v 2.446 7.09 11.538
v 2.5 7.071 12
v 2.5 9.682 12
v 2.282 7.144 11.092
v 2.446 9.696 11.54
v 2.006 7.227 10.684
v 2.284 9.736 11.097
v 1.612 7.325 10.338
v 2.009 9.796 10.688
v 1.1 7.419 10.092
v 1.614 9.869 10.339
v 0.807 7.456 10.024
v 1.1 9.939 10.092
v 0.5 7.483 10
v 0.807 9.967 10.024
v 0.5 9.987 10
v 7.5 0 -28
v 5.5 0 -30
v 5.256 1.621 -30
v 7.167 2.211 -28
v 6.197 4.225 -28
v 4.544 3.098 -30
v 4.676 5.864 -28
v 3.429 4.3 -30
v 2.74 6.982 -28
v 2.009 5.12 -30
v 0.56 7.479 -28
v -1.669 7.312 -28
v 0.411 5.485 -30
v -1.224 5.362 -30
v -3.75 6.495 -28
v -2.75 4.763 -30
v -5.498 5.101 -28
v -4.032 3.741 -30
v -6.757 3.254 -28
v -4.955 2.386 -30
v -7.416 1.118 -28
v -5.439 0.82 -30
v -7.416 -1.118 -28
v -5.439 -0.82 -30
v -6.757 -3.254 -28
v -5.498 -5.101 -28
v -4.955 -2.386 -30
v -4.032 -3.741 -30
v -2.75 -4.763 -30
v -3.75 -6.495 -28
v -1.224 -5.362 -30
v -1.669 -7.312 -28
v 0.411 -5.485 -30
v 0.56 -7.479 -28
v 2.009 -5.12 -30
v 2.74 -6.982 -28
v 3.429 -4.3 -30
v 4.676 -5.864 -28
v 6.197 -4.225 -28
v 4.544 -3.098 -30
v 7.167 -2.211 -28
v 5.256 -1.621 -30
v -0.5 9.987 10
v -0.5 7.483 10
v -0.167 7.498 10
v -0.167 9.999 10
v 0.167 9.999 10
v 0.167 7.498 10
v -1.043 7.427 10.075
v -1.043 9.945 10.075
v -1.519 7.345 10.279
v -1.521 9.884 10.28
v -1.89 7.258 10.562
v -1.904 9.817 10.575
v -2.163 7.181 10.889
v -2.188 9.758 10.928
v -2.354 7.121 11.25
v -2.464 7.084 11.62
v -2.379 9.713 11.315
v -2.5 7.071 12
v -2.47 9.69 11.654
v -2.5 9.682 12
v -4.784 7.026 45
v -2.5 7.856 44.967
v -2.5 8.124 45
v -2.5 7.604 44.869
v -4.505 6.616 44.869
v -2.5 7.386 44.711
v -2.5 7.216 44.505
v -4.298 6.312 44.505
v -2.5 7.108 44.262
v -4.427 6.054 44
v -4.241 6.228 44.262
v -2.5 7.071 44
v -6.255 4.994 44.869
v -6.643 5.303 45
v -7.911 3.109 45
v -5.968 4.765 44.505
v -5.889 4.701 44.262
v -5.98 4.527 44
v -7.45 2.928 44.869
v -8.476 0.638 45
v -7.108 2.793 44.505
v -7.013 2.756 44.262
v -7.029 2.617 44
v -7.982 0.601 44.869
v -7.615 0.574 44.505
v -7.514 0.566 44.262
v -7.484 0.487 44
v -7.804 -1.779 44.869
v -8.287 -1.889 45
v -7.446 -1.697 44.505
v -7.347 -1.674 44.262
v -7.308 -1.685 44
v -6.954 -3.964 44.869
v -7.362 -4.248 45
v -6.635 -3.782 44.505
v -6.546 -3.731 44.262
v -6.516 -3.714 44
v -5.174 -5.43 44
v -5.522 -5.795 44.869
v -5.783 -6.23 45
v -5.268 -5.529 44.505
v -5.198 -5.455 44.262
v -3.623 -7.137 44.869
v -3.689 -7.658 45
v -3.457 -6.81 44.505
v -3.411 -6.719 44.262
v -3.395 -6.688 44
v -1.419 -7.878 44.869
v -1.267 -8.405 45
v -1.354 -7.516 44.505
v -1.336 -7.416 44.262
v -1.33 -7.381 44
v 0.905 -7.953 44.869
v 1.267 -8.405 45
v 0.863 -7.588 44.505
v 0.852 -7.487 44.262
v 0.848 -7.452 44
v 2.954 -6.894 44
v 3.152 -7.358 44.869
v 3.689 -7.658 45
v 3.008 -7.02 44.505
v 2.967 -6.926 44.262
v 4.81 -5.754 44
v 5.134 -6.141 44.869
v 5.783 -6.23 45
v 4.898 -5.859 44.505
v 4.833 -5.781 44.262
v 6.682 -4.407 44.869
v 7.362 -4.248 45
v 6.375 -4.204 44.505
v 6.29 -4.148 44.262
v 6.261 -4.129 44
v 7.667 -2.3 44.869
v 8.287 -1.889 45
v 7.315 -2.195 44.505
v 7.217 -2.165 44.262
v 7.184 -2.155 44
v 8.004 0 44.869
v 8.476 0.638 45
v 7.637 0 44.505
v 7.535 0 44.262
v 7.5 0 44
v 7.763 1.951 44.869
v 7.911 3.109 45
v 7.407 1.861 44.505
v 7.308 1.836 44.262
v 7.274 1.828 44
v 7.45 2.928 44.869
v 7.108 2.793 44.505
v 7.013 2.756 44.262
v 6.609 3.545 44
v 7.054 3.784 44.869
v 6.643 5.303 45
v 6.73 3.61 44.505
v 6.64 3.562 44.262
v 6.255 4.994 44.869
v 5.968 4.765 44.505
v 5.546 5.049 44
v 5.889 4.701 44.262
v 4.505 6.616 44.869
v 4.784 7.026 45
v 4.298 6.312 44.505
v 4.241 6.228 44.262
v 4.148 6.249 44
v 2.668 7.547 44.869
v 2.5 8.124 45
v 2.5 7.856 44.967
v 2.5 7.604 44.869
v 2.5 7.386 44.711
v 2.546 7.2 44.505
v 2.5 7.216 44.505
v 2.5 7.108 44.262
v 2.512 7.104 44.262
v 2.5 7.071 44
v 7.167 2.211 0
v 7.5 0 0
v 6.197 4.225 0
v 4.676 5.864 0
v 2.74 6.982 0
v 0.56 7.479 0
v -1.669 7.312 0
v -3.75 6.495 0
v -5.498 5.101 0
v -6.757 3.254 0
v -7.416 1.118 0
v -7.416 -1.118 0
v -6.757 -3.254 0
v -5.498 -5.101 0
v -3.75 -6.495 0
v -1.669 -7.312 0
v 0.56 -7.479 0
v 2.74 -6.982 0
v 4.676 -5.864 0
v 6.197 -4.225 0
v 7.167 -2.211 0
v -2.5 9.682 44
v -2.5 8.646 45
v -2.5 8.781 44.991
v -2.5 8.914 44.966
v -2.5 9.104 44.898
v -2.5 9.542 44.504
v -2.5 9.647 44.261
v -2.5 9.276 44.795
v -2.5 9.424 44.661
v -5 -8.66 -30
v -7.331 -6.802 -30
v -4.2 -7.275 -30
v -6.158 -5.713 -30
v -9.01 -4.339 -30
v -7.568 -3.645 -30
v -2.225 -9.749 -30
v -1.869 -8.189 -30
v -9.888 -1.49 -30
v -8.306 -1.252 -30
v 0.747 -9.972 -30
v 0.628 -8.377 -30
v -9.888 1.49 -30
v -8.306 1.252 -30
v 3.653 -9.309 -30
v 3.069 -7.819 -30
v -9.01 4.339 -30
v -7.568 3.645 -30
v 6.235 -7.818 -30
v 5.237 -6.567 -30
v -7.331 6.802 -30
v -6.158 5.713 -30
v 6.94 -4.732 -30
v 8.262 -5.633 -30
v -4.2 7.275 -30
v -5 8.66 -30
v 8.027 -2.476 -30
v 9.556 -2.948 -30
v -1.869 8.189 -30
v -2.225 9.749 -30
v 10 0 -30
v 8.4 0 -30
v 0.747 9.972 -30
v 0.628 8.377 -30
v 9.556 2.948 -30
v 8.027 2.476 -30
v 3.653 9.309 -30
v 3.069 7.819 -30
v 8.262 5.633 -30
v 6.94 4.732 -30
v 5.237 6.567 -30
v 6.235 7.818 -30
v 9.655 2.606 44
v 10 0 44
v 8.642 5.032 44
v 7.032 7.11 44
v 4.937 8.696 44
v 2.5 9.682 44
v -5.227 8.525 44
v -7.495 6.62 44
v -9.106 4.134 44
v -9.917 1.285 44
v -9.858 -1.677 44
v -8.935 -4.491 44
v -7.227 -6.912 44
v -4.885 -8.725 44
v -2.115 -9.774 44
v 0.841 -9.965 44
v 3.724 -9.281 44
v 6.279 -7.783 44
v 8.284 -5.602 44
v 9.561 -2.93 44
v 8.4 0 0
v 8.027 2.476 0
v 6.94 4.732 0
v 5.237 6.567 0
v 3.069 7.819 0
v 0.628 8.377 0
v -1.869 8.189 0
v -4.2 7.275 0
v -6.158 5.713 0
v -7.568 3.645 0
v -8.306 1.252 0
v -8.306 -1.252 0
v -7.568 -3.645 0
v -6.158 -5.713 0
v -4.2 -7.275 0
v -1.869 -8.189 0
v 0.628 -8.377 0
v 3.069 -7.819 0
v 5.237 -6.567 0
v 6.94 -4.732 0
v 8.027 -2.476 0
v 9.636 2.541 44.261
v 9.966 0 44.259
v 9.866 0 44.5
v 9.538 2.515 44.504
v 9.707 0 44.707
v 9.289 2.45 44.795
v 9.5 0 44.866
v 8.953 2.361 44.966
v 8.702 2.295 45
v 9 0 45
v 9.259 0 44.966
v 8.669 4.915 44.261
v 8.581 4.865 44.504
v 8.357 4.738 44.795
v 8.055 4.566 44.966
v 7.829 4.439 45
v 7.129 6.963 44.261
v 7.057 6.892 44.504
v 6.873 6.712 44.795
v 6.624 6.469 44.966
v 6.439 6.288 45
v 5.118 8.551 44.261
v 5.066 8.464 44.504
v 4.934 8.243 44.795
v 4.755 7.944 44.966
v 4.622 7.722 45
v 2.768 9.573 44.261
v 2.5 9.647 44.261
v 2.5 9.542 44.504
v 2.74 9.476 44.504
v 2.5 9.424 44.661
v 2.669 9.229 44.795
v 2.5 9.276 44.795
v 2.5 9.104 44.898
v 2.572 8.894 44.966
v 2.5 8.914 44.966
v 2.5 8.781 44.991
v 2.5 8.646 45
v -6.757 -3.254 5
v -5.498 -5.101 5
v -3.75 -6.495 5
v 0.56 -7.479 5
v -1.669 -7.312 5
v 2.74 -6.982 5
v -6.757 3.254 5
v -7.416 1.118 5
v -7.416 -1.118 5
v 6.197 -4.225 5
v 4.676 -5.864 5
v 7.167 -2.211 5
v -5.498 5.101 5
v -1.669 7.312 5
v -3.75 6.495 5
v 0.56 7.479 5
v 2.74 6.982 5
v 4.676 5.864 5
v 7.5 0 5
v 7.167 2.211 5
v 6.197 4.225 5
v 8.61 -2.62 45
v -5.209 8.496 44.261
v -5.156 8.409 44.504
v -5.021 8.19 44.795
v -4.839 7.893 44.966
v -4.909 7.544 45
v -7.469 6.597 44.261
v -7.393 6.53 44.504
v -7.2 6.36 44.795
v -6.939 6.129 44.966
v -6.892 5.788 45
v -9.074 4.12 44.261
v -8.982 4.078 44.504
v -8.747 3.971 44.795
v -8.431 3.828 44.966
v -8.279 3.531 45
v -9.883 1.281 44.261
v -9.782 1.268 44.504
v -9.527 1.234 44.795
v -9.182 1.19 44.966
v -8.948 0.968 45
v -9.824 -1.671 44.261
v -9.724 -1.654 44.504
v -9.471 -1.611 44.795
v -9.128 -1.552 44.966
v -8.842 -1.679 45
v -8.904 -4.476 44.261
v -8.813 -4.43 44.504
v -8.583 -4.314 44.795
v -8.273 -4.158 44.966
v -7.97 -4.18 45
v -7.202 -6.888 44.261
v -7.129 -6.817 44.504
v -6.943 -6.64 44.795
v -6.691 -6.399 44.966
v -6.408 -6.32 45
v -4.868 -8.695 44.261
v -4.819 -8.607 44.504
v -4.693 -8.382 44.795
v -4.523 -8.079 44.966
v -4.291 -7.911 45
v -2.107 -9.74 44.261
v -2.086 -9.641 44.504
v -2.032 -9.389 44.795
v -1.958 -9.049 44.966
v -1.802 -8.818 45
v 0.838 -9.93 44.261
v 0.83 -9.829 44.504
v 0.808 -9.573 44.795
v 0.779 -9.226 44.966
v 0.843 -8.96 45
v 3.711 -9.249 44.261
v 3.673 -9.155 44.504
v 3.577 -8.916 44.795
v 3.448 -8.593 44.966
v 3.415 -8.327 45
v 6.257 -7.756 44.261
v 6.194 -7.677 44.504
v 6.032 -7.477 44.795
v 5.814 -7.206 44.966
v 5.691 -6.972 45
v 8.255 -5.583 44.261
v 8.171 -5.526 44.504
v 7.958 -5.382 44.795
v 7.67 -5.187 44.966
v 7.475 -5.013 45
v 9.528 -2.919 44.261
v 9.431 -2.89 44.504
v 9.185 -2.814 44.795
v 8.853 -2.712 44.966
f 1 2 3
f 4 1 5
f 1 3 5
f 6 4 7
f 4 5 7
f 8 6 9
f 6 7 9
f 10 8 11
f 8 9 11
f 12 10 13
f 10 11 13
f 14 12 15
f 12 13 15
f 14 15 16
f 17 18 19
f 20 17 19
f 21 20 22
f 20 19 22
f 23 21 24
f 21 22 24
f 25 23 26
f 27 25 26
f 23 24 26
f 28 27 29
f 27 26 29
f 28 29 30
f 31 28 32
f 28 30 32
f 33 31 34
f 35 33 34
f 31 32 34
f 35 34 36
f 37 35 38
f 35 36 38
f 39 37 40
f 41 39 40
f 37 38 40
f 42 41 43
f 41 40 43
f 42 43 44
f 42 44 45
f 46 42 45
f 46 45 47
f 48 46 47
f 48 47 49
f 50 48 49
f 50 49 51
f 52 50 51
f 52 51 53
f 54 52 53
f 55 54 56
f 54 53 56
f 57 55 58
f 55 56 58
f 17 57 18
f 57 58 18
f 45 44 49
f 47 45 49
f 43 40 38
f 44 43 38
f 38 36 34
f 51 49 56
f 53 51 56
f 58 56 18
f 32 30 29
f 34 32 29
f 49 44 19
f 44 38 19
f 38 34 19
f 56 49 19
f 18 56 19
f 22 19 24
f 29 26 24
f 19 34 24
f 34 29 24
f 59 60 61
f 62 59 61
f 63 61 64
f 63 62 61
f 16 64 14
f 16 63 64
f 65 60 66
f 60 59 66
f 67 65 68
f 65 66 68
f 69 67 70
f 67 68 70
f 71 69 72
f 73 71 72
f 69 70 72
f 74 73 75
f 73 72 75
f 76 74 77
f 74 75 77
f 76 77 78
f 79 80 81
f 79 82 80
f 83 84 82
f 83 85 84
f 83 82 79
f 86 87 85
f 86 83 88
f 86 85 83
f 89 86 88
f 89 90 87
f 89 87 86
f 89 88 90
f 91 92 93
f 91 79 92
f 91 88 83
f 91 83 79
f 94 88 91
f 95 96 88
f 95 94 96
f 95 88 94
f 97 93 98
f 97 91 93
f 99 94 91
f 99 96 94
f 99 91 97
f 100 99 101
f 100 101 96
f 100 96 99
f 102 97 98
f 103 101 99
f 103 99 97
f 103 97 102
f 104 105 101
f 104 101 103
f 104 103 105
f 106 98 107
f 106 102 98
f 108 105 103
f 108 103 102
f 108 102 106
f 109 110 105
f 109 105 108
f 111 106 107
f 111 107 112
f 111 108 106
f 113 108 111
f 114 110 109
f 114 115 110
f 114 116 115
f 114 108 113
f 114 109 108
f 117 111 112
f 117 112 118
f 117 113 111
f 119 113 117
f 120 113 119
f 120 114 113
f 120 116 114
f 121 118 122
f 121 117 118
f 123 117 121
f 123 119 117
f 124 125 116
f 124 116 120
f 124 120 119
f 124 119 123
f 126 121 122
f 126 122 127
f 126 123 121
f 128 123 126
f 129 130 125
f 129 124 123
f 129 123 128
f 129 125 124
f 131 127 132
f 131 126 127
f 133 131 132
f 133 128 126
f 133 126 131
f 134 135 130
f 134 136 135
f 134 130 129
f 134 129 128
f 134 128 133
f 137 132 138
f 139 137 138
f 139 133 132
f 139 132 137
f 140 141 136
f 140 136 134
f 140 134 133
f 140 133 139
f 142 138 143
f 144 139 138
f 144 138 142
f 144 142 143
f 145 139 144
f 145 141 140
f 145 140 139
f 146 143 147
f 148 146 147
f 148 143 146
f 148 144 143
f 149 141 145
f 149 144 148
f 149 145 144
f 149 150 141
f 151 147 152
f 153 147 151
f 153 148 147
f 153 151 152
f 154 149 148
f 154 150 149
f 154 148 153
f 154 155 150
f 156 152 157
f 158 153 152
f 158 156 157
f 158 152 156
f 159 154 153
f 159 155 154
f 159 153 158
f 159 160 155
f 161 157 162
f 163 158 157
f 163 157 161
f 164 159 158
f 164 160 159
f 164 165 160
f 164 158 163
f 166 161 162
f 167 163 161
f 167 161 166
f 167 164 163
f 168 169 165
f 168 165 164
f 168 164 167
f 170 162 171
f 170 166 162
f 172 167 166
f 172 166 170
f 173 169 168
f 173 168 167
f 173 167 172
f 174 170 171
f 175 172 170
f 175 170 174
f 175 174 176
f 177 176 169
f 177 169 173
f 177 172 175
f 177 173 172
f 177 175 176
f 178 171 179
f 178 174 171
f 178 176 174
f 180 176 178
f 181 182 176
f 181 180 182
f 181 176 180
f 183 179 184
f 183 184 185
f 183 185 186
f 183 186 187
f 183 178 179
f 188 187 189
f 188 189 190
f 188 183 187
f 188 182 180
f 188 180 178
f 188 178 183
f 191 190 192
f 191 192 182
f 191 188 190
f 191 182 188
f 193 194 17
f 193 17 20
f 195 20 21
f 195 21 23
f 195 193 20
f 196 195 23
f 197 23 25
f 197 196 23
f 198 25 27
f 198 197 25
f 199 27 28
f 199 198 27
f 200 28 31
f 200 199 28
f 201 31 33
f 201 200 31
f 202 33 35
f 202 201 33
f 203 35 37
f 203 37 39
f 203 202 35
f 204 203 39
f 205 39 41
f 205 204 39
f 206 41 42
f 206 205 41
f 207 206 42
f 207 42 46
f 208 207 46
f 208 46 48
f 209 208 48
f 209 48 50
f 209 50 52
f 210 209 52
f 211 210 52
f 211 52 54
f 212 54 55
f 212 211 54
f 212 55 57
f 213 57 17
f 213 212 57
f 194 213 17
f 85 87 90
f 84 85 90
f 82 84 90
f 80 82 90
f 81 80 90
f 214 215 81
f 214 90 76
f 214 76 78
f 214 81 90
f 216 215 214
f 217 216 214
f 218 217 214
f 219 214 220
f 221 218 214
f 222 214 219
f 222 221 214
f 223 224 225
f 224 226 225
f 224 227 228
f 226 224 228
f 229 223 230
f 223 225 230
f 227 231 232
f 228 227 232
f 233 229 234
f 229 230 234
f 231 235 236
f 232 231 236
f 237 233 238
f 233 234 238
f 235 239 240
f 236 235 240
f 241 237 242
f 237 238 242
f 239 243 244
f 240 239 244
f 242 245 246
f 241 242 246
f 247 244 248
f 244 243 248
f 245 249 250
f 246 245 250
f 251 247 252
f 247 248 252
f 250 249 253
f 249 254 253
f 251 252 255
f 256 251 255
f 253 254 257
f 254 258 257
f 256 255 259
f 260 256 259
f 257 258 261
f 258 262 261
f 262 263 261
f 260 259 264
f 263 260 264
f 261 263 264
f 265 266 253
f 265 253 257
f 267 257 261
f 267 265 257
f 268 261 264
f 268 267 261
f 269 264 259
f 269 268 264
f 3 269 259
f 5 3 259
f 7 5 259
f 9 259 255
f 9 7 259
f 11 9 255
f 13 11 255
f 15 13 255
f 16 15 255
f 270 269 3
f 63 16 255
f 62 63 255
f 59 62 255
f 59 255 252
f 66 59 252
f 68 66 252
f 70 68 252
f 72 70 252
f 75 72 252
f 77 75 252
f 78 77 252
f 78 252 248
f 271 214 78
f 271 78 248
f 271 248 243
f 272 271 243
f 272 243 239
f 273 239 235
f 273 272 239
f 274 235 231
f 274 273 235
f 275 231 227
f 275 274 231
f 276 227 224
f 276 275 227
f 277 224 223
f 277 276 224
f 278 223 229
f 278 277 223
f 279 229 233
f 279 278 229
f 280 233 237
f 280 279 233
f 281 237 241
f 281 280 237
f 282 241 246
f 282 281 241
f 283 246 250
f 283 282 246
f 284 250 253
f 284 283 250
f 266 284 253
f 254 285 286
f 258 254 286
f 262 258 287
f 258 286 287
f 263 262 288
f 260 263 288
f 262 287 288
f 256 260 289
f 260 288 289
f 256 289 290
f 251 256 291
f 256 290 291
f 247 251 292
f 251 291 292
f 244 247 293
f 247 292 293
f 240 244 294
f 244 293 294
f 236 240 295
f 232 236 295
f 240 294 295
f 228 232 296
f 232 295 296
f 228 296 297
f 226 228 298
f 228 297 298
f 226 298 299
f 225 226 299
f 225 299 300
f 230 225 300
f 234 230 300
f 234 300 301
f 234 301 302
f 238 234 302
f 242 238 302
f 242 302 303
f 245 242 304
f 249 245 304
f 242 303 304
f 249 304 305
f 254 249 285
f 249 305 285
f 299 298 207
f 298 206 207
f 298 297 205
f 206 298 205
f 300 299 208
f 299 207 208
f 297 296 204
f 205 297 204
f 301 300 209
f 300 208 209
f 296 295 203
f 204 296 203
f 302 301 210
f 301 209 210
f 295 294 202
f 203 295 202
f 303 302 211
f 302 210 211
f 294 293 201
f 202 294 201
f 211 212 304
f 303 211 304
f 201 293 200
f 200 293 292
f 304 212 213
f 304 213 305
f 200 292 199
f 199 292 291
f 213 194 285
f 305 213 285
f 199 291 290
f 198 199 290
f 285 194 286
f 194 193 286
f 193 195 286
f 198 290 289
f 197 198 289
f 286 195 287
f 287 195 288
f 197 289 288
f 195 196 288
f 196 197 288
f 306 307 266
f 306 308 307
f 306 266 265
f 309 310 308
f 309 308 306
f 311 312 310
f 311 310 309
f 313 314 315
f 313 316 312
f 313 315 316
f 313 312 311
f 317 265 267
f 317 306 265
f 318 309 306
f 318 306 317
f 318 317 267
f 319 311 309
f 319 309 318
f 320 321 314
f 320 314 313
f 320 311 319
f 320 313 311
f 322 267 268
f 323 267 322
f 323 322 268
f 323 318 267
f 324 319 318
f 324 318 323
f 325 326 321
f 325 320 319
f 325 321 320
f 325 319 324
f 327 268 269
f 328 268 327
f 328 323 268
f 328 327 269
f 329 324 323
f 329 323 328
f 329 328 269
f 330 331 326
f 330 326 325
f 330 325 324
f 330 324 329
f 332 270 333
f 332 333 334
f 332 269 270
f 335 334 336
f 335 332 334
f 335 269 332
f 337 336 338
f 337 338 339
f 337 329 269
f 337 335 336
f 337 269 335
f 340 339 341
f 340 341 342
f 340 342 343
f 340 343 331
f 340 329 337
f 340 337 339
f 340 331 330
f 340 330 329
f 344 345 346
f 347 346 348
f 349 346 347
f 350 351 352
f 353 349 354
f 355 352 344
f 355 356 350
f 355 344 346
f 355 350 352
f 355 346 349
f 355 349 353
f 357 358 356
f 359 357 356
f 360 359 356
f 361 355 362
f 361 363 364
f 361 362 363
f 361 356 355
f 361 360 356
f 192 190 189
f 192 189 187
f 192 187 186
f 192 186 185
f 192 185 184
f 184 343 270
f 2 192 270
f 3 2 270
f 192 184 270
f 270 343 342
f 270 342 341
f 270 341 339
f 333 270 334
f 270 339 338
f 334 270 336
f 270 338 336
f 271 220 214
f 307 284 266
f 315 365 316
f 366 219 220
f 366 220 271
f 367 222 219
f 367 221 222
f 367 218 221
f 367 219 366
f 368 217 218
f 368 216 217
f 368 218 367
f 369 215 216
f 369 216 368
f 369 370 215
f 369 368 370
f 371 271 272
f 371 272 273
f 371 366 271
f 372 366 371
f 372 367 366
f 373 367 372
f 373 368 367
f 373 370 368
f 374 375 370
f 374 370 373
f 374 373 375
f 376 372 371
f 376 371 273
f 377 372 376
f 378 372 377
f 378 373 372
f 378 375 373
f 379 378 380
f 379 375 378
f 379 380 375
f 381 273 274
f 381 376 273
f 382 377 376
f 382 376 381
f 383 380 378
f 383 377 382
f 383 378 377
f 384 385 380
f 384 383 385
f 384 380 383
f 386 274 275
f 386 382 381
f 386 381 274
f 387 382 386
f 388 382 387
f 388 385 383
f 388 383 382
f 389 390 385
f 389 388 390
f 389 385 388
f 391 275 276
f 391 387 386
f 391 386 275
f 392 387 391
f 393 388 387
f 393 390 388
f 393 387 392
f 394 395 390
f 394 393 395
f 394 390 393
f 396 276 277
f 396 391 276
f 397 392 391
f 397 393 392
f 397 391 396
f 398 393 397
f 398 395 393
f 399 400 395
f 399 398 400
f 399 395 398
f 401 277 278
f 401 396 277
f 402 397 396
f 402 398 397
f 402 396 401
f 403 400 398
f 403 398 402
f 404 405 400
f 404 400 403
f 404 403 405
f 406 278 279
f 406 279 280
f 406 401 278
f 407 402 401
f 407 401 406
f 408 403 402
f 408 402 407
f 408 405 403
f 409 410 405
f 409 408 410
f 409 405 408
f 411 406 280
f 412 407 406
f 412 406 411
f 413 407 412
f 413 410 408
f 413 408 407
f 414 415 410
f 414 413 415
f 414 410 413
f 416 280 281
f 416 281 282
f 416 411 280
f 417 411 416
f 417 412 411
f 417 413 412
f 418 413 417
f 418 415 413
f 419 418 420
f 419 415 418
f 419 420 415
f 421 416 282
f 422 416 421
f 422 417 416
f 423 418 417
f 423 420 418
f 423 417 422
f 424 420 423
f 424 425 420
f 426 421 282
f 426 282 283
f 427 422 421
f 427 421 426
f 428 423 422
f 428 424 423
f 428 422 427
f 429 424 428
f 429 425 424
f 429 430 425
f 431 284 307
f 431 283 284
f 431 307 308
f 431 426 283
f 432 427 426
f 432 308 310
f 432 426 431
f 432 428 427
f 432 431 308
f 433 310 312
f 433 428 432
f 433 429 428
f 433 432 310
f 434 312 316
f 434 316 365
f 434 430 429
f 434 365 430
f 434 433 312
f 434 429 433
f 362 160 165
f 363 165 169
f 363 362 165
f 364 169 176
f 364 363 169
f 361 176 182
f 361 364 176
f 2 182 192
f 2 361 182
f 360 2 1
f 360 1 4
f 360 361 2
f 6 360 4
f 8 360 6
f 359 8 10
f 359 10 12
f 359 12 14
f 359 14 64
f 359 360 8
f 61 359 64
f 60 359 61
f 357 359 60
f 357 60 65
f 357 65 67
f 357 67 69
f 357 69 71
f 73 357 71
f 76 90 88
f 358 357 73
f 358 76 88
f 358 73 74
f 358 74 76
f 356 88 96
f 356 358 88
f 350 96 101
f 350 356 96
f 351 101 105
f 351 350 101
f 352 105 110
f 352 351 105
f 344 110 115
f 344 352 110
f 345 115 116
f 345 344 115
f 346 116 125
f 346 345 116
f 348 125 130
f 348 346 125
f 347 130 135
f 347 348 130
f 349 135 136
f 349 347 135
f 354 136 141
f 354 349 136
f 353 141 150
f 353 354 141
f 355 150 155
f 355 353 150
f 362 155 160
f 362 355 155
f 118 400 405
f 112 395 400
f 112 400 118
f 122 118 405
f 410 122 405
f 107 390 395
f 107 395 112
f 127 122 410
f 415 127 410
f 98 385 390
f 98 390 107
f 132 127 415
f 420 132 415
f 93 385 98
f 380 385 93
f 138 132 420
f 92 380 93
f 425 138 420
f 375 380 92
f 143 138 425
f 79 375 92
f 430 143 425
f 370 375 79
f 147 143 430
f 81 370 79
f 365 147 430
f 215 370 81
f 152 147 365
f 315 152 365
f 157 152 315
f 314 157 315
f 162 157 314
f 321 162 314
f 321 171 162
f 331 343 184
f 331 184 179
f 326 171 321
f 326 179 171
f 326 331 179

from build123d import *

# Parameters (mm, degrees)
F0_R     = 10
F0_R_2   = 7.5
F1_DEPTH = 45
F2_DEPTH = 5
F3_R     = 10
F3_R_2   = 8.4
F4_DEPTH = 30
F5_SIZE  = 2
F6_W     = 5
F6_H     = 16.3043601838
F7_DEPTH = 35
F8_R     = 2
F9_R     = 1


with BuildPart() as f1:
    # F0 (on Top) → F1 (new body)
    with BuildSketch(Plane.XY):
        Circle(F0_R)
        Circle(F0_R_2, mode=Mode.SUBTRACT)
    extrude(amount=F1_DEPTH)

    # F0 (on Top) → F2 (join)
    with BuildSketch(Plane.XY):
        Circle(F0_R)
        Circle(F0_R_2, mode=Mode.SUBTRACT)
        Circle(F0_R_2)
    extrude(amount=F2_DEPTH)

    # F3 (on Top) + F0 (on Top) → F4 (join)
    with BuildSketch(Plane.XY):
        Circle(F3_R)
        Circle(F3_R_2, mode=Mode.SUBTRACT)
    with BuildSketch(Plane.XY):
        Circle(F0_R_2)
    extrude(amount=-F4_DEPTH)

    # F5
    f5_edges = [f1.edges().sort_by_distance(p)[0] for p in [
        (-7.5, 0, -30),
    ]]
    chamfer(f5_edges, length=F5_SIZE)

    # F6 (on face) → F7 (cut)
    with BuildSketch(Plane.XY.offset(45)):
        with Locations((0, 8.1521800919)):
            Rectangle(F6_W, F6_H)
    extrude(amount=-F7_DEPTH, mode=Mode.SUBTRACT)

    # F8
    f8_edges = [f1.edges().sort_by_distance(p)[0] for p in [
        (2.5, 8.376763, 10),
        (-2.5, 8.376763, 10),
    ]]
    fillet(f8_edges, radius=F8_R)

    # F9
    f9_edges = [f1.edges().sort_by_distance(p)[0] for p in [
        (-6.123724, -7.905694, 45),
        (7.905694, 6.123724, 45),
        (-4.330127, -6.123724, 45),
        (6.123724, 4.330127, 45),
    ]]
    fillet(f9_edges, radius=F9_R)


solid = f1.part
